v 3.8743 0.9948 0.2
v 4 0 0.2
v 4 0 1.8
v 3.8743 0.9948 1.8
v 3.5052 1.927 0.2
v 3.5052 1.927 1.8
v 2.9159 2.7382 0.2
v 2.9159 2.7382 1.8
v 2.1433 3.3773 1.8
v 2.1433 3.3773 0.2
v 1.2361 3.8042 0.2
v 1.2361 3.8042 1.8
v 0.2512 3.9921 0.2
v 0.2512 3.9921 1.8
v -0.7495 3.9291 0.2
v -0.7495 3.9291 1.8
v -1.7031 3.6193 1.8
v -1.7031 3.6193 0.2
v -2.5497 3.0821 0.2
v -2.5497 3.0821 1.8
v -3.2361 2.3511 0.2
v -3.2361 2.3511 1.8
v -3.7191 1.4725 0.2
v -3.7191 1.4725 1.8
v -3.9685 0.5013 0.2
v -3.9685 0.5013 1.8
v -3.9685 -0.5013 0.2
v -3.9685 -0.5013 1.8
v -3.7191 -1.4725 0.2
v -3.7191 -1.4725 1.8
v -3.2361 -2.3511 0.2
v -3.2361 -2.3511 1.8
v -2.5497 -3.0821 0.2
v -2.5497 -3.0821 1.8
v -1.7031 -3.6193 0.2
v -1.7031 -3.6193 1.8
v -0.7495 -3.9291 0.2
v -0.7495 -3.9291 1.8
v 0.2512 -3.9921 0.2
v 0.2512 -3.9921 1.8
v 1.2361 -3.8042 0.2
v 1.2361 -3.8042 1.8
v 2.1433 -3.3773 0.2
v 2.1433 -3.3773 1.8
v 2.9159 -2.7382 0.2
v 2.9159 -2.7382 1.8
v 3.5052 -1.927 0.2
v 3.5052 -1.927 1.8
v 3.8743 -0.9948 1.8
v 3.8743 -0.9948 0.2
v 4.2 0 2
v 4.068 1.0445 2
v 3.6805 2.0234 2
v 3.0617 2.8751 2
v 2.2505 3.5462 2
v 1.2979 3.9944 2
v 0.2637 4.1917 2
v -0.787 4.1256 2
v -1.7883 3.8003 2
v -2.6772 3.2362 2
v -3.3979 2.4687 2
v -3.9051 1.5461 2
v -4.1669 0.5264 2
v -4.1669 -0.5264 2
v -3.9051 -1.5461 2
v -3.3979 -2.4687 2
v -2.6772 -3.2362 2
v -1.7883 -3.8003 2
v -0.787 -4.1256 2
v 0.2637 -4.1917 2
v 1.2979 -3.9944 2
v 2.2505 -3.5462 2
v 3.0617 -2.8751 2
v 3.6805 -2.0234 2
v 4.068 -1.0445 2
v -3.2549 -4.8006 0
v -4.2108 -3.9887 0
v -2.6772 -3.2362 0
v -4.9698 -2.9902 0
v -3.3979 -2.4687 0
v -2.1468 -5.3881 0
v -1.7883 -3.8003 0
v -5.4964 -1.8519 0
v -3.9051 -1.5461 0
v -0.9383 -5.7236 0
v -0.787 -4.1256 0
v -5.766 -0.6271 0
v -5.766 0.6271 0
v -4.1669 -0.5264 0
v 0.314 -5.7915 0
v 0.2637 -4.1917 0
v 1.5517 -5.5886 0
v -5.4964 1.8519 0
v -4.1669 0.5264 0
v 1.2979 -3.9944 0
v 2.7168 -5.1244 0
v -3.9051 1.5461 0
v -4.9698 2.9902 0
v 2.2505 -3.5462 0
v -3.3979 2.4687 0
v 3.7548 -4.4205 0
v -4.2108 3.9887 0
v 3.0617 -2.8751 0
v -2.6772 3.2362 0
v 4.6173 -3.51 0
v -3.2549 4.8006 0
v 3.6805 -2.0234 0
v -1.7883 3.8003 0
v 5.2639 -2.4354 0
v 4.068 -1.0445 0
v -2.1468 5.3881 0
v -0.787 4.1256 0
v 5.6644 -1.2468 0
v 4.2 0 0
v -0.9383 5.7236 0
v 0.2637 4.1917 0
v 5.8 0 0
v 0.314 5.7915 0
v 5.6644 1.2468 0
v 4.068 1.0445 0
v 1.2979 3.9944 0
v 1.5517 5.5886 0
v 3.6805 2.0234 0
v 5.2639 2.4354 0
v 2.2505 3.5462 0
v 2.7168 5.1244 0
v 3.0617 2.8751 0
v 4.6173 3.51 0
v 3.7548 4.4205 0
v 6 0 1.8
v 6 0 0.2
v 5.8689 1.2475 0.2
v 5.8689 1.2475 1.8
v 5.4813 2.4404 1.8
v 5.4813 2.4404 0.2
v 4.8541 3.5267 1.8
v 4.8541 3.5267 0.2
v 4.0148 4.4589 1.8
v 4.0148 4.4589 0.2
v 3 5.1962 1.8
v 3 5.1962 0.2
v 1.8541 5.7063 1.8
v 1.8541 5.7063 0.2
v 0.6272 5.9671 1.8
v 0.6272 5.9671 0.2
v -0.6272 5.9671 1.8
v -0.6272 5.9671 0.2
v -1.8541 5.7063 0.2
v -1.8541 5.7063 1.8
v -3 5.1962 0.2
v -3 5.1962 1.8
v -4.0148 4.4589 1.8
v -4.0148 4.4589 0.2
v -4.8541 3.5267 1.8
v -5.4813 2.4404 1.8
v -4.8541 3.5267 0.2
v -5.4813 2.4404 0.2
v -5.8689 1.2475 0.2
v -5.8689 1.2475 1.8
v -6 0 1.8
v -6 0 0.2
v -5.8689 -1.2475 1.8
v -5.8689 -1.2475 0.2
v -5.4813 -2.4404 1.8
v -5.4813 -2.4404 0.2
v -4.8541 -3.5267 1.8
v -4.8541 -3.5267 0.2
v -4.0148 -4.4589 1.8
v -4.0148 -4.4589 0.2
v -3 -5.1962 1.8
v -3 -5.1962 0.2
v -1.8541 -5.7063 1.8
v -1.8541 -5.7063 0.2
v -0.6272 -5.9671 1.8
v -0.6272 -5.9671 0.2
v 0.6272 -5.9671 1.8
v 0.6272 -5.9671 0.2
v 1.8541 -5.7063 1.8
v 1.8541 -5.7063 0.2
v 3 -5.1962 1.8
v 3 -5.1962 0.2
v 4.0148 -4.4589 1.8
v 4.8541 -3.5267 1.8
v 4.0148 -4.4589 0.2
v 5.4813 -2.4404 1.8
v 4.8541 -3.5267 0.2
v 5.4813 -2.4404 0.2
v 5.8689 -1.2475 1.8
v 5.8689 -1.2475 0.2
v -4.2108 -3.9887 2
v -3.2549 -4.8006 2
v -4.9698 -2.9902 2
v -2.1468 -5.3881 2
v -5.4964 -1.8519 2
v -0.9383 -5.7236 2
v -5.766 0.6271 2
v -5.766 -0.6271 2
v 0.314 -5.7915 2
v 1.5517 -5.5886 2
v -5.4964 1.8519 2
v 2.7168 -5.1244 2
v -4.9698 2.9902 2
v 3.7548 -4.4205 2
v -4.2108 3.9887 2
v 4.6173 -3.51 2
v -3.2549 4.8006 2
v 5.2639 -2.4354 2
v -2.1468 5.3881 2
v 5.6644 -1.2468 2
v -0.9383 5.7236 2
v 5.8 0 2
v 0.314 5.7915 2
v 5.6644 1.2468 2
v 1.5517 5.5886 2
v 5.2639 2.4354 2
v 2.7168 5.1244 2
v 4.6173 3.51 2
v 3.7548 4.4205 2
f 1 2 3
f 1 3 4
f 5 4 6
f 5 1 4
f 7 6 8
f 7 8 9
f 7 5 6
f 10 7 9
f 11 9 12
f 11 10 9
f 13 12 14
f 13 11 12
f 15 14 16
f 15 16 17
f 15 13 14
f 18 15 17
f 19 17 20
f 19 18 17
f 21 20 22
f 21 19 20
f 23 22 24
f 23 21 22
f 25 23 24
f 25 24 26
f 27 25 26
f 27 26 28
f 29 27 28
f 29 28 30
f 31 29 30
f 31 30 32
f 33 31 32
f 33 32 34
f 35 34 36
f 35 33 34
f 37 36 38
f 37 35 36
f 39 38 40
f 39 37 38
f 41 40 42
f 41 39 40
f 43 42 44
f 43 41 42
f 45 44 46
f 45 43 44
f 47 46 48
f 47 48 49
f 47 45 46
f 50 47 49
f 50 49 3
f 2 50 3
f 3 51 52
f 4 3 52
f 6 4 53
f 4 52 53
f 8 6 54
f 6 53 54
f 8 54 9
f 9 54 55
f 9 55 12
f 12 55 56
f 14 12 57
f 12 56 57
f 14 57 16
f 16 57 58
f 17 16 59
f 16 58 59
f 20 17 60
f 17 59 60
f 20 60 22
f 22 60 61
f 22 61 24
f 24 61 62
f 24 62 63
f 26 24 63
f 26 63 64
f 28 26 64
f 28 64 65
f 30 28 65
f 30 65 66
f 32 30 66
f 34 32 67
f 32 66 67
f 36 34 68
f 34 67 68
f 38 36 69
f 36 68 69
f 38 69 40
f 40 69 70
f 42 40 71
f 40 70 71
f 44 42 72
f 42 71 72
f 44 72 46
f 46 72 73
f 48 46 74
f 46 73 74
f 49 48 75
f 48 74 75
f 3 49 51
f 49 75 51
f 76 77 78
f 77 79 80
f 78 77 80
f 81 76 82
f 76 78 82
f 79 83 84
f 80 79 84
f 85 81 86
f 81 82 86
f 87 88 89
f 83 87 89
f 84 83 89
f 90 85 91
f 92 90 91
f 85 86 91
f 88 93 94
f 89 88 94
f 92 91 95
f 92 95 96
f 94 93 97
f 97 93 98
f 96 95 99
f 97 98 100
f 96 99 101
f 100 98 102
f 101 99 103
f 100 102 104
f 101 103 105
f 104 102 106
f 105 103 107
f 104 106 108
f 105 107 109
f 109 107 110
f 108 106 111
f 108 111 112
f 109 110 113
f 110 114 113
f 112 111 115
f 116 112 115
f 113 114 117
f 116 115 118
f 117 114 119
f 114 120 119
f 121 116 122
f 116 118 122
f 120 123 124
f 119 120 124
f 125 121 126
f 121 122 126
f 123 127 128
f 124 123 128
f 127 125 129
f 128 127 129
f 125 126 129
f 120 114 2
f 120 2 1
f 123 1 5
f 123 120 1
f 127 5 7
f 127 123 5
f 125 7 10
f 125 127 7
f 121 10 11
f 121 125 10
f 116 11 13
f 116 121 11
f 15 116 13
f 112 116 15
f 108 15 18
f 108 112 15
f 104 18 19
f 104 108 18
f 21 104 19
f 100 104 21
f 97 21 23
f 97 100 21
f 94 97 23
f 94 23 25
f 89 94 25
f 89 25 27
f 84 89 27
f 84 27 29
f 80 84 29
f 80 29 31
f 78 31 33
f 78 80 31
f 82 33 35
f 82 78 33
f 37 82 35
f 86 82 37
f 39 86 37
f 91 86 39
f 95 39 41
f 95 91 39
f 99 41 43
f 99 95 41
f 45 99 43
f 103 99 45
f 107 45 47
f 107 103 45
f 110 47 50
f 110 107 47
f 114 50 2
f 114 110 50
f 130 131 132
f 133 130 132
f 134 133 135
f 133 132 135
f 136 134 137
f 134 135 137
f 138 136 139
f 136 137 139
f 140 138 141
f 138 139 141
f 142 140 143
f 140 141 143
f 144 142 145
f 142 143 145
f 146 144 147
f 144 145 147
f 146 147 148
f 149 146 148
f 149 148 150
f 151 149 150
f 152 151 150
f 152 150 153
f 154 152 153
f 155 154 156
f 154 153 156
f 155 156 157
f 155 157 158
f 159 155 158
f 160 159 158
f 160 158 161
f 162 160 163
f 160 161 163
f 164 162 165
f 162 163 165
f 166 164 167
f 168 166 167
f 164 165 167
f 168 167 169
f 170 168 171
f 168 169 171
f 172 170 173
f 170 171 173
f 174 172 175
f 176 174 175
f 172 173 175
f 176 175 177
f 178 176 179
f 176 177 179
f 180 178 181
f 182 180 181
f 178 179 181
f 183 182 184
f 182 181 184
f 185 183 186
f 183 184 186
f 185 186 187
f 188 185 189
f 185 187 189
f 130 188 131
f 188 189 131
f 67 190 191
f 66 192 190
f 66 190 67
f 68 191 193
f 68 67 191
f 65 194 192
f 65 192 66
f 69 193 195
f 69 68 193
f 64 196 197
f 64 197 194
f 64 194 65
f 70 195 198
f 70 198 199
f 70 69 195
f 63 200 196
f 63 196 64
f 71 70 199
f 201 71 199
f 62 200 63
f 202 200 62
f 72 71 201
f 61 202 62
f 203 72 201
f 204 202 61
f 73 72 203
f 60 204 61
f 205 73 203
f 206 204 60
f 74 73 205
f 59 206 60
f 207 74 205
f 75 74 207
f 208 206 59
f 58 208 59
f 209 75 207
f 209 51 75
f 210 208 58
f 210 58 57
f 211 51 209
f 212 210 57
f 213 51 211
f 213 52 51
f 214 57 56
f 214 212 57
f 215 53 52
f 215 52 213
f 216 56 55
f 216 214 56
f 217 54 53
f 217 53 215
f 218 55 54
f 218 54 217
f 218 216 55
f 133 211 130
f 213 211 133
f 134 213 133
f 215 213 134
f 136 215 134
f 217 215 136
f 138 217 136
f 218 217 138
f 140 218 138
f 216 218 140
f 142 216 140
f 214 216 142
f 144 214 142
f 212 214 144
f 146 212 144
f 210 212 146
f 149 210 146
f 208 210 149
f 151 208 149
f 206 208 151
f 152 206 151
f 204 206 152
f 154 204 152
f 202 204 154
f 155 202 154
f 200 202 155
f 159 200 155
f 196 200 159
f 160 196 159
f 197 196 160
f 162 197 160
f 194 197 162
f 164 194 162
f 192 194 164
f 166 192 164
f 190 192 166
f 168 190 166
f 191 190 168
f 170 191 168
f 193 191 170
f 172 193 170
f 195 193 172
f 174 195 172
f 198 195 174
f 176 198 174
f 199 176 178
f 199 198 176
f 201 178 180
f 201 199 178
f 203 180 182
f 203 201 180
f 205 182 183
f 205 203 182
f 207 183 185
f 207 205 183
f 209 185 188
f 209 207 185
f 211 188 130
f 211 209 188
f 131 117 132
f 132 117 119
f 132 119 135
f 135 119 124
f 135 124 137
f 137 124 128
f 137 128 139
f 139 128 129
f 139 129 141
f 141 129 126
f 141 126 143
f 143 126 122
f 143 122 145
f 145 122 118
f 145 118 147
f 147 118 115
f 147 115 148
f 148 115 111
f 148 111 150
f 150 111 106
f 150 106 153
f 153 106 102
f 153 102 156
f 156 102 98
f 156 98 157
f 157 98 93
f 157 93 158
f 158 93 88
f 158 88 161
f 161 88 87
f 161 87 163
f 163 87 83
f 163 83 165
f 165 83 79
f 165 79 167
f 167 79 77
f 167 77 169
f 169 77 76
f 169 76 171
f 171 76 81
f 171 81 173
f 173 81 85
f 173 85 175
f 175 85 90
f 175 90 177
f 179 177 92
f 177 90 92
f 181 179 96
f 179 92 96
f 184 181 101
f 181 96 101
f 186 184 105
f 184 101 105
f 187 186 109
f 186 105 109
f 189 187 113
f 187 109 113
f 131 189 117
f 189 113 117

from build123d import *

# Parameters (mm, degrees)
SKETCH_1_R      = 6
SKETCH_1_R_2    = 4
EXTRUDE_1_DEPTH = 2
CHAMFER_1_SIZE  = 0.2


with BuildPart() as part:
    # 草图1 → 拉伸1 (new body)
    with BuildSketch(Plane.XY):
        Circle(SKETCH_1_R)
        Circle(SKETCH_1_R_2, mode=Mode.SUBTRACT)
    extrude(amount=EXTRUDE_1_DEPTH)

    # 倒角1
    chamfer_1_edges = [part.edges().sort_by_distance(p)[0] for p in [
        (-6, 0, 0),
        (-6, 0, 2),
        (-4, 0, 0),
        (-4, 0, 2),
    ]]
    chamfer(chamfer_1_edges, length=CHAMFER_1_SIZE)


solid = part.part
